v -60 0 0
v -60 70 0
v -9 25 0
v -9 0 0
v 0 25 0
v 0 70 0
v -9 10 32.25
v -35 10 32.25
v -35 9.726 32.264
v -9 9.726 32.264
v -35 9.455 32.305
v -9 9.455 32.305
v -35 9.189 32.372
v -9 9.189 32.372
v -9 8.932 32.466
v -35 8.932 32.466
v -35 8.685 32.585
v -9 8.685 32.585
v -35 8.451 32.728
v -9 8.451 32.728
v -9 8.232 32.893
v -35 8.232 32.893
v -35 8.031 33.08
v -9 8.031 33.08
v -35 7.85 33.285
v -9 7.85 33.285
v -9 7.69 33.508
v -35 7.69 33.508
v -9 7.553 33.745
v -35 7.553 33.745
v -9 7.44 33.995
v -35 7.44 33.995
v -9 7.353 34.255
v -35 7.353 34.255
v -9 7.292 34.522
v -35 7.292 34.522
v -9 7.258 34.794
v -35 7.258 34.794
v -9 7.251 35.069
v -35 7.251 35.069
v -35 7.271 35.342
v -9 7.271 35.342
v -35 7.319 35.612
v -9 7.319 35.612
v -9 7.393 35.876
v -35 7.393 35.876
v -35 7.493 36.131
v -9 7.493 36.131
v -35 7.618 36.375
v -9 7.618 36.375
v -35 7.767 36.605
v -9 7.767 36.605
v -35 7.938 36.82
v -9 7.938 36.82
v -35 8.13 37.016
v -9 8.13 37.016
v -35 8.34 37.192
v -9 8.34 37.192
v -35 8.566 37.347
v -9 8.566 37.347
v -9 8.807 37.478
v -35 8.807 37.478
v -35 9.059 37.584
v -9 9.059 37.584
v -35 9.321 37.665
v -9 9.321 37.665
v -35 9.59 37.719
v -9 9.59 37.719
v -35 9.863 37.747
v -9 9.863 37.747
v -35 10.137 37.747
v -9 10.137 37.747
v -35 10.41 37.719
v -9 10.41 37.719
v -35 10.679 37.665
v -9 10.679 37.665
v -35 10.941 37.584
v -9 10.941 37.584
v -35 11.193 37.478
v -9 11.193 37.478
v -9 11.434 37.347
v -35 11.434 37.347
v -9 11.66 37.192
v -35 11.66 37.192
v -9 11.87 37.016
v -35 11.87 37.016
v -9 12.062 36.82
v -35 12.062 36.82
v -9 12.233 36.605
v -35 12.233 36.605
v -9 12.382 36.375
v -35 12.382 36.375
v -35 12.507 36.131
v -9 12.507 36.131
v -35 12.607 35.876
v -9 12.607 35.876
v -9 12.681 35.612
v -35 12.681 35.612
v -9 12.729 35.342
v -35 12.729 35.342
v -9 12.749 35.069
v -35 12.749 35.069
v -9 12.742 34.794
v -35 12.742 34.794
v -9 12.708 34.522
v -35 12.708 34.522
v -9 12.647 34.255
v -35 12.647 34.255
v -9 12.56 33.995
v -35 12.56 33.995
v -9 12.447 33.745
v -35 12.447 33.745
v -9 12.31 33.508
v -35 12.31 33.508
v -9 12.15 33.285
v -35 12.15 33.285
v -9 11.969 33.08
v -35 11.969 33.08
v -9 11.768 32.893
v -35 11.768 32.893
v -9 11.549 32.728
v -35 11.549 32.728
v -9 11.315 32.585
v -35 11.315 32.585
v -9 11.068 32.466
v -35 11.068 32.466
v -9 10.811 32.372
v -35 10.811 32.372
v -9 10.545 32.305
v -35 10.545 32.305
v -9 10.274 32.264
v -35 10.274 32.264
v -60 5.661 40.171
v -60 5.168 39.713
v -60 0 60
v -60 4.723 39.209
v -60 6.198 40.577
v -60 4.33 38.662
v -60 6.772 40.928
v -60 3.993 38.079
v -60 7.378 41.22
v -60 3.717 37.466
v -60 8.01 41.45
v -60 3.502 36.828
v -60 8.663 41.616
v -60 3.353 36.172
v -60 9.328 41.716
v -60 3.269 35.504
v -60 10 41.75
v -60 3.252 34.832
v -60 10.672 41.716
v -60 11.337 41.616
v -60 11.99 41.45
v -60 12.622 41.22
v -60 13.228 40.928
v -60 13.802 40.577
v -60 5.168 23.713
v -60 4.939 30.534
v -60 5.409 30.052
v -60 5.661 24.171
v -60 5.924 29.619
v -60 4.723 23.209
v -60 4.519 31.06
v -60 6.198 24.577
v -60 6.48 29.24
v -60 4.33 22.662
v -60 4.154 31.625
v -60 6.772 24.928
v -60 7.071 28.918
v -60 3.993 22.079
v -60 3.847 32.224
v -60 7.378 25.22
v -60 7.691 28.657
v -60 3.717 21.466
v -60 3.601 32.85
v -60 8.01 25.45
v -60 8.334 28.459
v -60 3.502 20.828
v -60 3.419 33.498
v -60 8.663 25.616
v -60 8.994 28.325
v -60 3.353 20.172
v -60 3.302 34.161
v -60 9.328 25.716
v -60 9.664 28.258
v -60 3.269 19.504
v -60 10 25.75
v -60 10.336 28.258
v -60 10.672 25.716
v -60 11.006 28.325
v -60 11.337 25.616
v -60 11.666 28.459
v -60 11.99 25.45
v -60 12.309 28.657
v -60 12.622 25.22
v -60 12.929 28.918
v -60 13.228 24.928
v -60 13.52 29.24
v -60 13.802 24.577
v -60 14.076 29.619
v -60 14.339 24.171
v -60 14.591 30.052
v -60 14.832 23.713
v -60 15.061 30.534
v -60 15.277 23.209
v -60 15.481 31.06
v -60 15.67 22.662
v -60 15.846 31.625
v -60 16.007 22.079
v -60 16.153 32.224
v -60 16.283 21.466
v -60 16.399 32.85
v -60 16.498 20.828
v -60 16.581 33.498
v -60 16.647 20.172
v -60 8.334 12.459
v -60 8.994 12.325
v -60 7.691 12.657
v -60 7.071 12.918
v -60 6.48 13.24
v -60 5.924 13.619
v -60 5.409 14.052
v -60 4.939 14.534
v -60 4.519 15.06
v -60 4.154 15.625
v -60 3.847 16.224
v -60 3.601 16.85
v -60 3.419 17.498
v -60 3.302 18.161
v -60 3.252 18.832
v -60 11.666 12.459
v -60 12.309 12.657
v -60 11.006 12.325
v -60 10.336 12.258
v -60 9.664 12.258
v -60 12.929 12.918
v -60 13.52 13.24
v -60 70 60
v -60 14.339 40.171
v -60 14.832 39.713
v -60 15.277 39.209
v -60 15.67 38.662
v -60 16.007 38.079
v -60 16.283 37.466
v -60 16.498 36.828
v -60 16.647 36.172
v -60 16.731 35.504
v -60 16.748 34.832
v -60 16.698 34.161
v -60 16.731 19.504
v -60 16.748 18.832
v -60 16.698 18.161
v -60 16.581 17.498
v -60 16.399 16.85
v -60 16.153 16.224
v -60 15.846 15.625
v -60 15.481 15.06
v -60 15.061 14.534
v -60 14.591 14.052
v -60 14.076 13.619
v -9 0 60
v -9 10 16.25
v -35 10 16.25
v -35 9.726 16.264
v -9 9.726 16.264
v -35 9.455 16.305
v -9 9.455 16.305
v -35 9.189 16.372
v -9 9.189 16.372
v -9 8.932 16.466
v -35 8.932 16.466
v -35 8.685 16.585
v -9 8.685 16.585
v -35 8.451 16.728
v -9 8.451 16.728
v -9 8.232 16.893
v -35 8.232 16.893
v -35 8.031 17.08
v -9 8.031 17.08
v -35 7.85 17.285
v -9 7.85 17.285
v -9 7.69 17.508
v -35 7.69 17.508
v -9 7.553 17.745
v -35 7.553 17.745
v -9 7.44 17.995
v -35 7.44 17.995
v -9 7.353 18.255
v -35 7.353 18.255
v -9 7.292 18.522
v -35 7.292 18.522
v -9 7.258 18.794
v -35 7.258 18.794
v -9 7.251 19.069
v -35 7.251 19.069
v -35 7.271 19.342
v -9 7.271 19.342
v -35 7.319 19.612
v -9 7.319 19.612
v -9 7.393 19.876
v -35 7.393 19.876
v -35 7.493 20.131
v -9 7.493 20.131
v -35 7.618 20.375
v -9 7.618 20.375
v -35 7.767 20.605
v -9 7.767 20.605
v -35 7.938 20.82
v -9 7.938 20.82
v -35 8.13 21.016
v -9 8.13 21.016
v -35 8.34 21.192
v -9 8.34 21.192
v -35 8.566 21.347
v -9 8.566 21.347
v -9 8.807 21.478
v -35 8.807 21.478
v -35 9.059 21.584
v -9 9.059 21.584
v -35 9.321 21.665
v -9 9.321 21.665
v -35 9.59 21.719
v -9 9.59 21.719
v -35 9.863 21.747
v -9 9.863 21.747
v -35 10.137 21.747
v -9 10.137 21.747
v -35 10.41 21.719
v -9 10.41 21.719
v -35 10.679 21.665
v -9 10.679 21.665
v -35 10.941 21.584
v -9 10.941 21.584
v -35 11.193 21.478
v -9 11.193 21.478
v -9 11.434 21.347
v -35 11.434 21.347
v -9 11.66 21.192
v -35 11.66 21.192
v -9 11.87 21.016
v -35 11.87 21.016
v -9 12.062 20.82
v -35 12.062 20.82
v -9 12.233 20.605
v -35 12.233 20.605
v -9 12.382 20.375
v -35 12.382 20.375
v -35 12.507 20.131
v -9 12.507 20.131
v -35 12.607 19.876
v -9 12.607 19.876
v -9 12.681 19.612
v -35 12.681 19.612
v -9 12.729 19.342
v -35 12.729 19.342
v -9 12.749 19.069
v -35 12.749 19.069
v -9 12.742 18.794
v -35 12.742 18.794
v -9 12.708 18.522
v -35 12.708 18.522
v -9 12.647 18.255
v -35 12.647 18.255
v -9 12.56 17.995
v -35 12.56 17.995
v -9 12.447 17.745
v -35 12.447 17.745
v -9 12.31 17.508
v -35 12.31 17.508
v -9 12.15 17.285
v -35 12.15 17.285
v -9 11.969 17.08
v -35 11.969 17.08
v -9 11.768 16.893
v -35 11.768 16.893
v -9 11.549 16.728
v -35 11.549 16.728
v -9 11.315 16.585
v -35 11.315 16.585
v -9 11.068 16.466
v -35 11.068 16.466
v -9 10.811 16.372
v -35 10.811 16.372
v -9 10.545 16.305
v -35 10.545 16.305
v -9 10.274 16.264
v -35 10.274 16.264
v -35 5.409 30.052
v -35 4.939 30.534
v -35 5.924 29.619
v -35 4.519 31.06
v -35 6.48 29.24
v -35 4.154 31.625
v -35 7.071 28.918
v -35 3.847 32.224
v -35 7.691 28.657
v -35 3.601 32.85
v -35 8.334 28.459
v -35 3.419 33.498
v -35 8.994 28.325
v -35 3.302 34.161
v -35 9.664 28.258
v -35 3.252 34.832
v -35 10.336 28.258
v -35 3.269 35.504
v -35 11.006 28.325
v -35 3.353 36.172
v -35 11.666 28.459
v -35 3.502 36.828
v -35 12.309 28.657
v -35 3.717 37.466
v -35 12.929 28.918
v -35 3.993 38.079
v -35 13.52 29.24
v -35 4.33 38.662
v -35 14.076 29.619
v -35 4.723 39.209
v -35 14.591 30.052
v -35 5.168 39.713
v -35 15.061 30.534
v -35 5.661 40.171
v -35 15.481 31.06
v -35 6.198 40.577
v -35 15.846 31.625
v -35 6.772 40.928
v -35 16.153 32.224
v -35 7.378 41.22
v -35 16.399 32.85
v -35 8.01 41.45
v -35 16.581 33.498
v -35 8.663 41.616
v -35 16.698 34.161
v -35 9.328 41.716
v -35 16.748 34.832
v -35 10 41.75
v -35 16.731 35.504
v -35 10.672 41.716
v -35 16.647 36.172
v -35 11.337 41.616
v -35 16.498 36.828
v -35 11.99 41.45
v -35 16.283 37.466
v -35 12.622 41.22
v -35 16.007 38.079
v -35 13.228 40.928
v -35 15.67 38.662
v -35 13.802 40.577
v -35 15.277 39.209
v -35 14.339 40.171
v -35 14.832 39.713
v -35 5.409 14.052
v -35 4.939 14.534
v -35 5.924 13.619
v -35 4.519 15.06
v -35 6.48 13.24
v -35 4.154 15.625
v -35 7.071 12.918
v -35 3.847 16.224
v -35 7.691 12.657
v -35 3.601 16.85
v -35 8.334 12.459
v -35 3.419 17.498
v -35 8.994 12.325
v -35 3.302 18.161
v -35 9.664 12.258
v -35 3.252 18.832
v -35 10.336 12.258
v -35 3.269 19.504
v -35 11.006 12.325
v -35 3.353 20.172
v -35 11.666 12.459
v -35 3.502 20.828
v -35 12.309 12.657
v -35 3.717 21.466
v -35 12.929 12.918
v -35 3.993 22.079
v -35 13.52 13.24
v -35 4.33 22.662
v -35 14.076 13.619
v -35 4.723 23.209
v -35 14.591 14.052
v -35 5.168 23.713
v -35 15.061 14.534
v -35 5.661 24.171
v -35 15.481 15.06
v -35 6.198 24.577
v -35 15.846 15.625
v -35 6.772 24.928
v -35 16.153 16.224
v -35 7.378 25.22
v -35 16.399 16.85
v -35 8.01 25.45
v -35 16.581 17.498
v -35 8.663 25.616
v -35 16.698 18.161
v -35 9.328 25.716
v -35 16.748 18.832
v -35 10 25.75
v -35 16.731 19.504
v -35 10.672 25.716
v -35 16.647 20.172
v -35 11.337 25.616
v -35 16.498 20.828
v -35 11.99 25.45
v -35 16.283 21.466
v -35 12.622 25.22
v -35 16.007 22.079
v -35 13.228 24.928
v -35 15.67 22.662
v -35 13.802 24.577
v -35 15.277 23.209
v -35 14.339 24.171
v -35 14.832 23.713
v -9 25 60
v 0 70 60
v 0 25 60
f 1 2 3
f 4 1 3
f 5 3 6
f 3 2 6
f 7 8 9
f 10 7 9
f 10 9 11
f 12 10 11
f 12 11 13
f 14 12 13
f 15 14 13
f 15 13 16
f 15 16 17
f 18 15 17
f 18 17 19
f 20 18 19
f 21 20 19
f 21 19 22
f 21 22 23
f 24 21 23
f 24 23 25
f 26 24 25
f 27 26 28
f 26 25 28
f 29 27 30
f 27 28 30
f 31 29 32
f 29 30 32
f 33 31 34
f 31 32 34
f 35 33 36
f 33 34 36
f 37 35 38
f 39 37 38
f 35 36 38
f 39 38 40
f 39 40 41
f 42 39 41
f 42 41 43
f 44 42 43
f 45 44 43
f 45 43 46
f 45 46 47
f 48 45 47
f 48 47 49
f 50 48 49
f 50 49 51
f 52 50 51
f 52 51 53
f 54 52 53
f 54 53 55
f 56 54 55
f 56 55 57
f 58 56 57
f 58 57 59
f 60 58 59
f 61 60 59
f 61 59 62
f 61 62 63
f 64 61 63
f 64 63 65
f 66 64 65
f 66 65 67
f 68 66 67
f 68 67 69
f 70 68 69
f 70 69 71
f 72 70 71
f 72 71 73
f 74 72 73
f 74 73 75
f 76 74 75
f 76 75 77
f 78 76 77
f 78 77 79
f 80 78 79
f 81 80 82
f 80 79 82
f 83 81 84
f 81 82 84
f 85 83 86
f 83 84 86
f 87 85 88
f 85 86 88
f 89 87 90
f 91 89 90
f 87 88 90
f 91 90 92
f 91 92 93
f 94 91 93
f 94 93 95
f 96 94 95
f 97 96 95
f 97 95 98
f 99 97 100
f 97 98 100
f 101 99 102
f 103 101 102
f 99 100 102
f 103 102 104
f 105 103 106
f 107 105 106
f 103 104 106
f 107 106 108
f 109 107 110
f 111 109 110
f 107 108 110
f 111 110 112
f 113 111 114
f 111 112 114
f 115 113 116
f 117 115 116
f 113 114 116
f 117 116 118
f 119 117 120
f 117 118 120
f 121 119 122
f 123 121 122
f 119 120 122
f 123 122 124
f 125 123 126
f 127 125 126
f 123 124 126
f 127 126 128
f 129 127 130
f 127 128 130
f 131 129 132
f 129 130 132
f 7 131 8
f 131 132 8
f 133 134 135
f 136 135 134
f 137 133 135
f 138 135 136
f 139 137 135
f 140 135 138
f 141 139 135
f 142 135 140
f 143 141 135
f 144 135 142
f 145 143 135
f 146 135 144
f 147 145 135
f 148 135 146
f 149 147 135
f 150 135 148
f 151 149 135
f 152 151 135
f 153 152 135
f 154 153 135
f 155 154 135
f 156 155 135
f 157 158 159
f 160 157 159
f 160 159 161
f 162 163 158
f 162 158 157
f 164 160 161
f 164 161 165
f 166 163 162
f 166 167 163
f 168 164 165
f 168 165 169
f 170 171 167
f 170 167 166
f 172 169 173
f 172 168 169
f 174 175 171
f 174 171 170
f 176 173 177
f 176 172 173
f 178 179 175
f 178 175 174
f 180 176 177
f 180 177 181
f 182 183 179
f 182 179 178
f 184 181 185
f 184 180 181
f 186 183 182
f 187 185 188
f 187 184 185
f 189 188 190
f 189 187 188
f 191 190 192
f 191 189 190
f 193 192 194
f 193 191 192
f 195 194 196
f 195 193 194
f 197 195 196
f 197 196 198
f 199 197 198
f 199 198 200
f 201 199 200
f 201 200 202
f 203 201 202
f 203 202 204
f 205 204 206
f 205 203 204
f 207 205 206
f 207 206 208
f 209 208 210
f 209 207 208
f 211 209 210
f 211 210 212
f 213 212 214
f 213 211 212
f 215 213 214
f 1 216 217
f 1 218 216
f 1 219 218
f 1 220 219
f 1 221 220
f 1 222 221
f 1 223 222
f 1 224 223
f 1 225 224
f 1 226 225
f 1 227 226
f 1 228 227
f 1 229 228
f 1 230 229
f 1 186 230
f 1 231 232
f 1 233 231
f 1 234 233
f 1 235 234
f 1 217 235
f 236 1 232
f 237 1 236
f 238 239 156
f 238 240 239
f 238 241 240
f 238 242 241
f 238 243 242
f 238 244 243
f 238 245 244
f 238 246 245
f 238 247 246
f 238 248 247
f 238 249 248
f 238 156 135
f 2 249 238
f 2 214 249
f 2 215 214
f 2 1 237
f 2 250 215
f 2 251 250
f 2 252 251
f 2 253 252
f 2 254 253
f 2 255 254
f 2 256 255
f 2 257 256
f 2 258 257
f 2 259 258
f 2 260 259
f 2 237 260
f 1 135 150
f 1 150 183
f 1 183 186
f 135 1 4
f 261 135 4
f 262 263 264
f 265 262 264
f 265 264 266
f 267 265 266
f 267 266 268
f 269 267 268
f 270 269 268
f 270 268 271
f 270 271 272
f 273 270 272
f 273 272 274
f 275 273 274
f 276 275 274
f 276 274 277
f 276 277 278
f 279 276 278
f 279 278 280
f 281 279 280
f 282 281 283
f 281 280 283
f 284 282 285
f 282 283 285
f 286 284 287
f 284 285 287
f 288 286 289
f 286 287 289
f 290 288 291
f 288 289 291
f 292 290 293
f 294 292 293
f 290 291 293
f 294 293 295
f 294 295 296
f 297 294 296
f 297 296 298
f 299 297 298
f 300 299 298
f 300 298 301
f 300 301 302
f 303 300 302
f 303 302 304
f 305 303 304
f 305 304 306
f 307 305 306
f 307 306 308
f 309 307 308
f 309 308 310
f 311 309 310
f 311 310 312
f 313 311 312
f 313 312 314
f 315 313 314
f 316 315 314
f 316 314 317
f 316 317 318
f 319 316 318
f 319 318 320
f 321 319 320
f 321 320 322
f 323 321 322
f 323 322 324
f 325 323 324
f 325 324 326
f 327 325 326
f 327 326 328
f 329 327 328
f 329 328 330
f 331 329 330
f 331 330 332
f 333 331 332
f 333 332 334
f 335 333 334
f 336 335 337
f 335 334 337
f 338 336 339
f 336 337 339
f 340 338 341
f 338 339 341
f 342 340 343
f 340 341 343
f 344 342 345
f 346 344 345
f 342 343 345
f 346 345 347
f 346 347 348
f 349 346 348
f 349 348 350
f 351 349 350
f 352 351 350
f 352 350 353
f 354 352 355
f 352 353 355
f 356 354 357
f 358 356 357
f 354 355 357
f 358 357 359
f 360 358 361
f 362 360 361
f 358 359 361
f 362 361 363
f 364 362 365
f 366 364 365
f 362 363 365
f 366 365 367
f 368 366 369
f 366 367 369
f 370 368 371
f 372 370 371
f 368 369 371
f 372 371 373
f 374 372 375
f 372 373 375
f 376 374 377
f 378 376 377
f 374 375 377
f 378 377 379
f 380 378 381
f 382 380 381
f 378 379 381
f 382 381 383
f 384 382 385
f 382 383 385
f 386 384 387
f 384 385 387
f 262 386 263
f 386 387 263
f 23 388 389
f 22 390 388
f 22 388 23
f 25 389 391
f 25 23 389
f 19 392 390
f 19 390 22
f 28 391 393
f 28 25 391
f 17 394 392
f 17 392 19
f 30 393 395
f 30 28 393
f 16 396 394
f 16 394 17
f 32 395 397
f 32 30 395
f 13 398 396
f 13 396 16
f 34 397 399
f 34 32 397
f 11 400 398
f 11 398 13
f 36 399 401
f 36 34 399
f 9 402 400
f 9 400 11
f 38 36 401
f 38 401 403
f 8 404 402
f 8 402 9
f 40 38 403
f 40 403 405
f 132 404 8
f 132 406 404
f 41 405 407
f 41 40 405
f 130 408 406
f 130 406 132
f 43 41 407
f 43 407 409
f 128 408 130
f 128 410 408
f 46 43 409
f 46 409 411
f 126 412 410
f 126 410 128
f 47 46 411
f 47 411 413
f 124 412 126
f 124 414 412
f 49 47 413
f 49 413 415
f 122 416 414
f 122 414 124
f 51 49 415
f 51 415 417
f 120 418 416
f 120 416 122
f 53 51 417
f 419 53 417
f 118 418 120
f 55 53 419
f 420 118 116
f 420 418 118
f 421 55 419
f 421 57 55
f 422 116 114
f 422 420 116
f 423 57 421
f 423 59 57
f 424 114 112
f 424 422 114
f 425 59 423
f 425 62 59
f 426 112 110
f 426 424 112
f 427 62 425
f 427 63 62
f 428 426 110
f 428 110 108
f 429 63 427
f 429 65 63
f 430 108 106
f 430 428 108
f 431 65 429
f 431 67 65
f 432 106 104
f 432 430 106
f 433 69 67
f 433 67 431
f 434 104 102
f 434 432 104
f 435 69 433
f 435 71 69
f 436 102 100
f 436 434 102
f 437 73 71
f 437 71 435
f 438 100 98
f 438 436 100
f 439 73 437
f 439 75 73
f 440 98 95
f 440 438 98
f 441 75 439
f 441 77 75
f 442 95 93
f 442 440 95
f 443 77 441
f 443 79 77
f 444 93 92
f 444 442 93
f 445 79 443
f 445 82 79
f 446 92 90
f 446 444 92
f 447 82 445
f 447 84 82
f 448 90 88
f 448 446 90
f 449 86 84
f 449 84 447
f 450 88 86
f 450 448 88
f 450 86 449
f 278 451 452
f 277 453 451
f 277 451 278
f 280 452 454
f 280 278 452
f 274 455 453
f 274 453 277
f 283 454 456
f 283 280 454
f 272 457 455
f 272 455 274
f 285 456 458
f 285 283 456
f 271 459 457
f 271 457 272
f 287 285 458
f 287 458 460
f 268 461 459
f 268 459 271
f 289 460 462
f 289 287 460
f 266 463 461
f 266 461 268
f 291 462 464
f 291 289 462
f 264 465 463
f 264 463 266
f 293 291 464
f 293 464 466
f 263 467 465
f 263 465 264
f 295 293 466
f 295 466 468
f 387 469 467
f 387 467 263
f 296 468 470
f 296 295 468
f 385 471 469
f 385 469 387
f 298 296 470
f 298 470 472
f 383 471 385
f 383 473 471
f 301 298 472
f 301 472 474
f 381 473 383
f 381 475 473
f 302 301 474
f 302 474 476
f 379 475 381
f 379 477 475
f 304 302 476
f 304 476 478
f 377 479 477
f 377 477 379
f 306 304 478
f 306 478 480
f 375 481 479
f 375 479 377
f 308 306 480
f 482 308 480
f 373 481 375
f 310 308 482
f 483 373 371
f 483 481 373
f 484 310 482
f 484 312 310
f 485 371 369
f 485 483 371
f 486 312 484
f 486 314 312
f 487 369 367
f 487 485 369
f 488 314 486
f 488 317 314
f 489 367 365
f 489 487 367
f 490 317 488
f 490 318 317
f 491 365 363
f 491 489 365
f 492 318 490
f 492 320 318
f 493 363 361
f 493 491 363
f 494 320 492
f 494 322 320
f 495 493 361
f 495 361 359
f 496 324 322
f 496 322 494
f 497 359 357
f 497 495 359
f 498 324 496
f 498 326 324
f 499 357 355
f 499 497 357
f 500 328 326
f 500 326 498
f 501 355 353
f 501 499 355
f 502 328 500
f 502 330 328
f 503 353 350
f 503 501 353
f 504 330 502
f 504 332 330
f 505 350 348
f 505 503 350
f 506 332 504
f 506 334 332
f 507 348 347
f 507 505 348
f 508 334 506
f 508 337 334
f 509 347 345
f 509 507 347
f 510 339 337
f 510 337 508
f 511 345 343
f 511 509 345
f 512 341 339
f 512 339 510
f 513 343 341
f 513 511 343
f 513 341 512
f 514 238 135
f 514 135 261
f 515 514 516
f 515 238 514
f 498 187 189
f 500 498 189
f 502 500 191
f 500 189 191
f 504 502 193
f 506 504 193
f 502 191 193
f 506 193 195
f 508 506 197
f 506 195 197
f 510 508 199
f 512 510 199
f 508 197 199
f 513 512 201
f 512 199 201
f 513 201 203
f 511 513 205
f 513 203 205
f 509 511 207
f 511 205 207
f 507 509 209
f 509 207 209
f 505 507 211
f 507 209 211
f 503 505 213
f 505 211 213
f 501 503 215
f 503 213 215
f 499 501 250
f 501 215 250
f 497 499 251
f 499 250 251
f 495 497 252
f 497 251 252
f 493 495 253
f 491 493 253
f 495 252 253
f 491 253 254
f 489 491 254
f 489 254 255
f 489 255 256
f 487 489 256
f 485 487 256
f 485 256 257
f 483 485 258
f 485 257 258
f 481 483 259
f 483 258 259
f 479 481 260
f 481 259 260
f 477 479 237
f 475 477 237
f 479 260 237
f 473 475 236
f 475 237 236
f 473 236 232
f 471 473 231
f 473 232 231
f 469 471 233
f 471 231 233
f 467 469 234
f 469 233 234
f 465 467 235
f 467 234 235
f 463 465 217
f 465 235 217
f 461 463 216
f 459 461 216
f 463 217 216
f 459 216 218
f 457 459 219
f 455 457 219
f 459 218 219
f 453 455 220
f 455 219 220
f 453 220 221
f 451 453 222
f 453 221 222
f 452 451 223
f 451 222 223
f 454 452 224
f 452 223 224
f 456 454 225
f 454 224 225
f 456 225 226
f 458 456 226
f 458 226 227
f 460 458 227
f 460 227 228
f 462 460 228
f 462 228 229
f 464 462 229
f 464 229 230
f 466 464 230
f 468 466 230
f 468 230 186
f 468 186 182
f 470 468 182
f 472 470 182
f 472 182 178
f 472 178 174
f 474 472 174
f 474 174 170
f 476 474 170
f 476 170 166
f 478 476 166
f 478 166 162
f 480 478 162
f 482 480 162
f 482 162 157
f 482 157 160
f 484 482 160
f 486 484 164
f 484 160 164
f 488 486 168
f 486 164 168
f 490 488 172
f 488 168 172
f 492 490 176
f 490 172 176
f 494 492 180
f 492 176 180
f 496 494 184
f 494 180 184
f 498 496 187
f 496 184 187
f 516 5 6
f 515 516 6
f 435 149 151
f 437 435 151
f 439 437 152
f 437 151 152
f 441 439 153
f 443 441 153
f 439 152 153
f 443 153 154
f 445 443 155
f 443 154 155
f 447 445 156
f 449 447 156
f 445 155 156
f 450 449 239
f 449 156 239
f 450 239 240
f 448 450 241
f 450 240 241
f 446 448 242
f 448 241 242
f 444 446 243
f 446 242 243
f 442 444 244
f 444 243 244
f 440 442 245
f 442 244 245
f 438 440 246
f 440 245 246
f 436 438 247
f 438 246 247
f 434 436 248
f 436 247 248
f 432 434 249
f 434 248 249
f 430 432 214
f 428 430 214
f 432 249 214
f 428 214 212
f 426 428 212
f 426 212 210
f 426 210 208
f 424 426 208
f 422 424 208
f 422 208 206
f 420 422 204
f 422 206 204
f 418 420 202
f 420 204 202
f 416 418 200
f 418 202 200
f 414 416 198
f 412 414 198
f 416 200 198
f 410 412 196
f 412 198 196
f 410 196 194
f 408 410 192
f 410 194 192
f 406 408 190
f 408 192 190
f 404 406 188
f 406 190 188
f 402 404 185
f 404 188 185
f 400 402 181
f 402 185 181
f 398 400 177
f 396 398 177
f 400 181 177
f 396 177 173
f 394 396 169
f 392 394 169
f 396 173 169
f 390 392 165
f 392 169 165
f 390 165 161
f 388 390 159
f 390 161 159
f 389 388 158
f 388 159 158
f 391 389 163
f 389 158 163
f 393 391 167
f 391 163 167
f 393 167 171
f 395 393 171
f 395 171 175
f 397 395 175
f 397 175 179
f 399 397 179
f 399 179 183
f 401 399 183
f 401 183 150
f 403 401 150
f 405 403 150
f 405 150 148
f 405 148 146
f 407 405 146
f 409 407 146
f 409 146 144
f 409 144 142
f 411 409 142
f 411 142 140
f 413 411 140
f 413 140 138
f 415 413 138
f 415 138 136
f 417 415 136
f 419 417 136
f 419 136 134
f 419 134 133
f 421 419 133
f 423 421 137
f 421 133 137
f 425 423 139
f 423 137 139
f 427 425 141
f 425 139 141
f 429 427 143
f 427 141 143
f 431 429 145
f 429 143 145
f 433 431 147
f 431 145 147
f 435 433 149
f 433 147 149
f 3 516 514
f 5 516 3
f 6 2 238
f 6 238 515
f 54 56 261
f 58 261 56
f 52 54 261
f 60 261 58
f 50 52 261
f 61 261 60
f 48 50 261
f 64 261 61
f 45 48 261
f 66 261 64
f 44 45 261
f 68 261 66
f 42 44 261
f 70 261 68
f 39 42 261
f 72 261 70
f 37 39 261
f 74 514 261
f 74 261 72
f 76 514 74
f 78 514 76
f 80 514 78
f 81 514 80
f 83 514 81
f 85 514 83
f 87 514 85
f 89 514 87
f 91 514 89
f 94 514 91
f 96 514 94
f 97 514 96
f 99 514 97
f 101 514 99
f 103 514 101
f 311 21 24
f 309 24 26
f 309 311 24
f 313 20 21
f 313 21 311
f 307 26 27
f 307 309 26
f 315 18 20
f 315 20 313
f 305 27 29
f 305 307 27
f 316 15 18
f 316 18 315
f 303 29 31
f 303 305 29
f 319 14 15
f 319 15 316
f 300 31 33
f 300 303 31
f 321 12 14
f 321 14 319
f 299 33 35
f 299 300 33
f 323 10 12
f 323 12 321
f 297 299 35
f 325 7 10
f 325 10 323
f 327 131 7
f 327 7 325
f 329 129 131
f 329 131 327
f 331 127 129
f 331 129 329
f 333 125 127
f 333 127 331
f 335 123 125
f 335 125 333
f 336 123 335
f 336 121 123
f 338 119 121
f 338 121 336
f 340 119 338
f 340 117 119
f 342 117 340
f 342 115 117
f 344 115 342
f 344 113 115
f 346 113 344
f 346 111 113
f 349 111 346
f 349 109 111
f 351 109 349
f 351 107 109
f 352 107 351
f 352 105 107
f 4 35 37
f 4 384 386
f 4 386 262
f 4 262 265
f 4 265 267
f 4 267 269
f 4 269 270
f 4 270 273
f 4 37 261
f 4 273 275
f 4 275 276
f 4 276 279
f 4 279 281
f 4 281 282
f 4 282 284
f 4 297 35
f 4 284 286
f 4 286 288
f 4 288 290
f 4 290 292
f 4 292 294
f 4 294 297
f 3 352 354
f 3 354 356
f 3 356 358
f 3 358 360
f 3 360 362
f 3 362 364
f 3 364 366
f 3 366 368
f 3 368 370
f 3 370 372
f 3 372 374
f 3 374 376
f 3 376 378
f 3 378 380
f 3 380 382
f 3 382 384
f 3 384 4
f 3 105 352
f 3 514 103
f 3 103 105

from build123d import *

# Parameters (mm, degrees)
SKETCH1_W            = 60
SKETCH1_H            = 70
BOSS_EXTRUDE1_DEPTH  = 60
SKETCH2_W            = 60
SKETCH2_H            = 25
CUT_EXTRUDE1_DEPTH   = 9
M5_CLEARANCE_HOLE1_D = 5.5
SKETCH12_R           = 6.75
CUT_EXTRUDE2_DEPTH   = 25


with BuildPart() as part:
    # Sketch1 → Boss-Extrude1 (new body)
    with BuildSketch(Plane.XY):
        with Locations((-30, 35)):
            Rectangle(SKETCH1_W, SKETCH1_H)
    extrude(amount=BOSS_EXTRUDE1_DEPTH)

    # Sketch2 → Cut-Extrude1 (cut)
    with BuildSketch(Plane(origin=(0, 0, 0), x_dir=(0, 0, -1), z_dir=(1, 0, 0))):
        with Locations((-30, 12.5)):
            Rectangle(SKETCH2_W, SKETCH2_H)
    extrude(amount=-CUT_EXTRUDE1_DEPTH, mode=Mode.SUBTRACT)

    # M5 Clearance Hole1 (through all)
    with Locations(Plane(origin=(-9, 10, 35), x_dir=(0, 0, 1), z_dir=(1, 0, 0))):
        with Locations((0, 0), (-16, 0)):
            Hole(M5_CLEARANCE_HOLE1_D / 2)

    # Sketch12 → Cut-Extrude2 (cut)
    with BuildSketch(Plane.ZY.offset(60)):
        with Locations((19, 10)):
            Circle(SKETCH12_R)
        with Locations((35, 10)):
            Circle(SKETCH12_R)
    extrude(amount=-CUT_EXTRUDE2_DEPTH, mode=Mode.SUBTRACT)


solid = part.part
